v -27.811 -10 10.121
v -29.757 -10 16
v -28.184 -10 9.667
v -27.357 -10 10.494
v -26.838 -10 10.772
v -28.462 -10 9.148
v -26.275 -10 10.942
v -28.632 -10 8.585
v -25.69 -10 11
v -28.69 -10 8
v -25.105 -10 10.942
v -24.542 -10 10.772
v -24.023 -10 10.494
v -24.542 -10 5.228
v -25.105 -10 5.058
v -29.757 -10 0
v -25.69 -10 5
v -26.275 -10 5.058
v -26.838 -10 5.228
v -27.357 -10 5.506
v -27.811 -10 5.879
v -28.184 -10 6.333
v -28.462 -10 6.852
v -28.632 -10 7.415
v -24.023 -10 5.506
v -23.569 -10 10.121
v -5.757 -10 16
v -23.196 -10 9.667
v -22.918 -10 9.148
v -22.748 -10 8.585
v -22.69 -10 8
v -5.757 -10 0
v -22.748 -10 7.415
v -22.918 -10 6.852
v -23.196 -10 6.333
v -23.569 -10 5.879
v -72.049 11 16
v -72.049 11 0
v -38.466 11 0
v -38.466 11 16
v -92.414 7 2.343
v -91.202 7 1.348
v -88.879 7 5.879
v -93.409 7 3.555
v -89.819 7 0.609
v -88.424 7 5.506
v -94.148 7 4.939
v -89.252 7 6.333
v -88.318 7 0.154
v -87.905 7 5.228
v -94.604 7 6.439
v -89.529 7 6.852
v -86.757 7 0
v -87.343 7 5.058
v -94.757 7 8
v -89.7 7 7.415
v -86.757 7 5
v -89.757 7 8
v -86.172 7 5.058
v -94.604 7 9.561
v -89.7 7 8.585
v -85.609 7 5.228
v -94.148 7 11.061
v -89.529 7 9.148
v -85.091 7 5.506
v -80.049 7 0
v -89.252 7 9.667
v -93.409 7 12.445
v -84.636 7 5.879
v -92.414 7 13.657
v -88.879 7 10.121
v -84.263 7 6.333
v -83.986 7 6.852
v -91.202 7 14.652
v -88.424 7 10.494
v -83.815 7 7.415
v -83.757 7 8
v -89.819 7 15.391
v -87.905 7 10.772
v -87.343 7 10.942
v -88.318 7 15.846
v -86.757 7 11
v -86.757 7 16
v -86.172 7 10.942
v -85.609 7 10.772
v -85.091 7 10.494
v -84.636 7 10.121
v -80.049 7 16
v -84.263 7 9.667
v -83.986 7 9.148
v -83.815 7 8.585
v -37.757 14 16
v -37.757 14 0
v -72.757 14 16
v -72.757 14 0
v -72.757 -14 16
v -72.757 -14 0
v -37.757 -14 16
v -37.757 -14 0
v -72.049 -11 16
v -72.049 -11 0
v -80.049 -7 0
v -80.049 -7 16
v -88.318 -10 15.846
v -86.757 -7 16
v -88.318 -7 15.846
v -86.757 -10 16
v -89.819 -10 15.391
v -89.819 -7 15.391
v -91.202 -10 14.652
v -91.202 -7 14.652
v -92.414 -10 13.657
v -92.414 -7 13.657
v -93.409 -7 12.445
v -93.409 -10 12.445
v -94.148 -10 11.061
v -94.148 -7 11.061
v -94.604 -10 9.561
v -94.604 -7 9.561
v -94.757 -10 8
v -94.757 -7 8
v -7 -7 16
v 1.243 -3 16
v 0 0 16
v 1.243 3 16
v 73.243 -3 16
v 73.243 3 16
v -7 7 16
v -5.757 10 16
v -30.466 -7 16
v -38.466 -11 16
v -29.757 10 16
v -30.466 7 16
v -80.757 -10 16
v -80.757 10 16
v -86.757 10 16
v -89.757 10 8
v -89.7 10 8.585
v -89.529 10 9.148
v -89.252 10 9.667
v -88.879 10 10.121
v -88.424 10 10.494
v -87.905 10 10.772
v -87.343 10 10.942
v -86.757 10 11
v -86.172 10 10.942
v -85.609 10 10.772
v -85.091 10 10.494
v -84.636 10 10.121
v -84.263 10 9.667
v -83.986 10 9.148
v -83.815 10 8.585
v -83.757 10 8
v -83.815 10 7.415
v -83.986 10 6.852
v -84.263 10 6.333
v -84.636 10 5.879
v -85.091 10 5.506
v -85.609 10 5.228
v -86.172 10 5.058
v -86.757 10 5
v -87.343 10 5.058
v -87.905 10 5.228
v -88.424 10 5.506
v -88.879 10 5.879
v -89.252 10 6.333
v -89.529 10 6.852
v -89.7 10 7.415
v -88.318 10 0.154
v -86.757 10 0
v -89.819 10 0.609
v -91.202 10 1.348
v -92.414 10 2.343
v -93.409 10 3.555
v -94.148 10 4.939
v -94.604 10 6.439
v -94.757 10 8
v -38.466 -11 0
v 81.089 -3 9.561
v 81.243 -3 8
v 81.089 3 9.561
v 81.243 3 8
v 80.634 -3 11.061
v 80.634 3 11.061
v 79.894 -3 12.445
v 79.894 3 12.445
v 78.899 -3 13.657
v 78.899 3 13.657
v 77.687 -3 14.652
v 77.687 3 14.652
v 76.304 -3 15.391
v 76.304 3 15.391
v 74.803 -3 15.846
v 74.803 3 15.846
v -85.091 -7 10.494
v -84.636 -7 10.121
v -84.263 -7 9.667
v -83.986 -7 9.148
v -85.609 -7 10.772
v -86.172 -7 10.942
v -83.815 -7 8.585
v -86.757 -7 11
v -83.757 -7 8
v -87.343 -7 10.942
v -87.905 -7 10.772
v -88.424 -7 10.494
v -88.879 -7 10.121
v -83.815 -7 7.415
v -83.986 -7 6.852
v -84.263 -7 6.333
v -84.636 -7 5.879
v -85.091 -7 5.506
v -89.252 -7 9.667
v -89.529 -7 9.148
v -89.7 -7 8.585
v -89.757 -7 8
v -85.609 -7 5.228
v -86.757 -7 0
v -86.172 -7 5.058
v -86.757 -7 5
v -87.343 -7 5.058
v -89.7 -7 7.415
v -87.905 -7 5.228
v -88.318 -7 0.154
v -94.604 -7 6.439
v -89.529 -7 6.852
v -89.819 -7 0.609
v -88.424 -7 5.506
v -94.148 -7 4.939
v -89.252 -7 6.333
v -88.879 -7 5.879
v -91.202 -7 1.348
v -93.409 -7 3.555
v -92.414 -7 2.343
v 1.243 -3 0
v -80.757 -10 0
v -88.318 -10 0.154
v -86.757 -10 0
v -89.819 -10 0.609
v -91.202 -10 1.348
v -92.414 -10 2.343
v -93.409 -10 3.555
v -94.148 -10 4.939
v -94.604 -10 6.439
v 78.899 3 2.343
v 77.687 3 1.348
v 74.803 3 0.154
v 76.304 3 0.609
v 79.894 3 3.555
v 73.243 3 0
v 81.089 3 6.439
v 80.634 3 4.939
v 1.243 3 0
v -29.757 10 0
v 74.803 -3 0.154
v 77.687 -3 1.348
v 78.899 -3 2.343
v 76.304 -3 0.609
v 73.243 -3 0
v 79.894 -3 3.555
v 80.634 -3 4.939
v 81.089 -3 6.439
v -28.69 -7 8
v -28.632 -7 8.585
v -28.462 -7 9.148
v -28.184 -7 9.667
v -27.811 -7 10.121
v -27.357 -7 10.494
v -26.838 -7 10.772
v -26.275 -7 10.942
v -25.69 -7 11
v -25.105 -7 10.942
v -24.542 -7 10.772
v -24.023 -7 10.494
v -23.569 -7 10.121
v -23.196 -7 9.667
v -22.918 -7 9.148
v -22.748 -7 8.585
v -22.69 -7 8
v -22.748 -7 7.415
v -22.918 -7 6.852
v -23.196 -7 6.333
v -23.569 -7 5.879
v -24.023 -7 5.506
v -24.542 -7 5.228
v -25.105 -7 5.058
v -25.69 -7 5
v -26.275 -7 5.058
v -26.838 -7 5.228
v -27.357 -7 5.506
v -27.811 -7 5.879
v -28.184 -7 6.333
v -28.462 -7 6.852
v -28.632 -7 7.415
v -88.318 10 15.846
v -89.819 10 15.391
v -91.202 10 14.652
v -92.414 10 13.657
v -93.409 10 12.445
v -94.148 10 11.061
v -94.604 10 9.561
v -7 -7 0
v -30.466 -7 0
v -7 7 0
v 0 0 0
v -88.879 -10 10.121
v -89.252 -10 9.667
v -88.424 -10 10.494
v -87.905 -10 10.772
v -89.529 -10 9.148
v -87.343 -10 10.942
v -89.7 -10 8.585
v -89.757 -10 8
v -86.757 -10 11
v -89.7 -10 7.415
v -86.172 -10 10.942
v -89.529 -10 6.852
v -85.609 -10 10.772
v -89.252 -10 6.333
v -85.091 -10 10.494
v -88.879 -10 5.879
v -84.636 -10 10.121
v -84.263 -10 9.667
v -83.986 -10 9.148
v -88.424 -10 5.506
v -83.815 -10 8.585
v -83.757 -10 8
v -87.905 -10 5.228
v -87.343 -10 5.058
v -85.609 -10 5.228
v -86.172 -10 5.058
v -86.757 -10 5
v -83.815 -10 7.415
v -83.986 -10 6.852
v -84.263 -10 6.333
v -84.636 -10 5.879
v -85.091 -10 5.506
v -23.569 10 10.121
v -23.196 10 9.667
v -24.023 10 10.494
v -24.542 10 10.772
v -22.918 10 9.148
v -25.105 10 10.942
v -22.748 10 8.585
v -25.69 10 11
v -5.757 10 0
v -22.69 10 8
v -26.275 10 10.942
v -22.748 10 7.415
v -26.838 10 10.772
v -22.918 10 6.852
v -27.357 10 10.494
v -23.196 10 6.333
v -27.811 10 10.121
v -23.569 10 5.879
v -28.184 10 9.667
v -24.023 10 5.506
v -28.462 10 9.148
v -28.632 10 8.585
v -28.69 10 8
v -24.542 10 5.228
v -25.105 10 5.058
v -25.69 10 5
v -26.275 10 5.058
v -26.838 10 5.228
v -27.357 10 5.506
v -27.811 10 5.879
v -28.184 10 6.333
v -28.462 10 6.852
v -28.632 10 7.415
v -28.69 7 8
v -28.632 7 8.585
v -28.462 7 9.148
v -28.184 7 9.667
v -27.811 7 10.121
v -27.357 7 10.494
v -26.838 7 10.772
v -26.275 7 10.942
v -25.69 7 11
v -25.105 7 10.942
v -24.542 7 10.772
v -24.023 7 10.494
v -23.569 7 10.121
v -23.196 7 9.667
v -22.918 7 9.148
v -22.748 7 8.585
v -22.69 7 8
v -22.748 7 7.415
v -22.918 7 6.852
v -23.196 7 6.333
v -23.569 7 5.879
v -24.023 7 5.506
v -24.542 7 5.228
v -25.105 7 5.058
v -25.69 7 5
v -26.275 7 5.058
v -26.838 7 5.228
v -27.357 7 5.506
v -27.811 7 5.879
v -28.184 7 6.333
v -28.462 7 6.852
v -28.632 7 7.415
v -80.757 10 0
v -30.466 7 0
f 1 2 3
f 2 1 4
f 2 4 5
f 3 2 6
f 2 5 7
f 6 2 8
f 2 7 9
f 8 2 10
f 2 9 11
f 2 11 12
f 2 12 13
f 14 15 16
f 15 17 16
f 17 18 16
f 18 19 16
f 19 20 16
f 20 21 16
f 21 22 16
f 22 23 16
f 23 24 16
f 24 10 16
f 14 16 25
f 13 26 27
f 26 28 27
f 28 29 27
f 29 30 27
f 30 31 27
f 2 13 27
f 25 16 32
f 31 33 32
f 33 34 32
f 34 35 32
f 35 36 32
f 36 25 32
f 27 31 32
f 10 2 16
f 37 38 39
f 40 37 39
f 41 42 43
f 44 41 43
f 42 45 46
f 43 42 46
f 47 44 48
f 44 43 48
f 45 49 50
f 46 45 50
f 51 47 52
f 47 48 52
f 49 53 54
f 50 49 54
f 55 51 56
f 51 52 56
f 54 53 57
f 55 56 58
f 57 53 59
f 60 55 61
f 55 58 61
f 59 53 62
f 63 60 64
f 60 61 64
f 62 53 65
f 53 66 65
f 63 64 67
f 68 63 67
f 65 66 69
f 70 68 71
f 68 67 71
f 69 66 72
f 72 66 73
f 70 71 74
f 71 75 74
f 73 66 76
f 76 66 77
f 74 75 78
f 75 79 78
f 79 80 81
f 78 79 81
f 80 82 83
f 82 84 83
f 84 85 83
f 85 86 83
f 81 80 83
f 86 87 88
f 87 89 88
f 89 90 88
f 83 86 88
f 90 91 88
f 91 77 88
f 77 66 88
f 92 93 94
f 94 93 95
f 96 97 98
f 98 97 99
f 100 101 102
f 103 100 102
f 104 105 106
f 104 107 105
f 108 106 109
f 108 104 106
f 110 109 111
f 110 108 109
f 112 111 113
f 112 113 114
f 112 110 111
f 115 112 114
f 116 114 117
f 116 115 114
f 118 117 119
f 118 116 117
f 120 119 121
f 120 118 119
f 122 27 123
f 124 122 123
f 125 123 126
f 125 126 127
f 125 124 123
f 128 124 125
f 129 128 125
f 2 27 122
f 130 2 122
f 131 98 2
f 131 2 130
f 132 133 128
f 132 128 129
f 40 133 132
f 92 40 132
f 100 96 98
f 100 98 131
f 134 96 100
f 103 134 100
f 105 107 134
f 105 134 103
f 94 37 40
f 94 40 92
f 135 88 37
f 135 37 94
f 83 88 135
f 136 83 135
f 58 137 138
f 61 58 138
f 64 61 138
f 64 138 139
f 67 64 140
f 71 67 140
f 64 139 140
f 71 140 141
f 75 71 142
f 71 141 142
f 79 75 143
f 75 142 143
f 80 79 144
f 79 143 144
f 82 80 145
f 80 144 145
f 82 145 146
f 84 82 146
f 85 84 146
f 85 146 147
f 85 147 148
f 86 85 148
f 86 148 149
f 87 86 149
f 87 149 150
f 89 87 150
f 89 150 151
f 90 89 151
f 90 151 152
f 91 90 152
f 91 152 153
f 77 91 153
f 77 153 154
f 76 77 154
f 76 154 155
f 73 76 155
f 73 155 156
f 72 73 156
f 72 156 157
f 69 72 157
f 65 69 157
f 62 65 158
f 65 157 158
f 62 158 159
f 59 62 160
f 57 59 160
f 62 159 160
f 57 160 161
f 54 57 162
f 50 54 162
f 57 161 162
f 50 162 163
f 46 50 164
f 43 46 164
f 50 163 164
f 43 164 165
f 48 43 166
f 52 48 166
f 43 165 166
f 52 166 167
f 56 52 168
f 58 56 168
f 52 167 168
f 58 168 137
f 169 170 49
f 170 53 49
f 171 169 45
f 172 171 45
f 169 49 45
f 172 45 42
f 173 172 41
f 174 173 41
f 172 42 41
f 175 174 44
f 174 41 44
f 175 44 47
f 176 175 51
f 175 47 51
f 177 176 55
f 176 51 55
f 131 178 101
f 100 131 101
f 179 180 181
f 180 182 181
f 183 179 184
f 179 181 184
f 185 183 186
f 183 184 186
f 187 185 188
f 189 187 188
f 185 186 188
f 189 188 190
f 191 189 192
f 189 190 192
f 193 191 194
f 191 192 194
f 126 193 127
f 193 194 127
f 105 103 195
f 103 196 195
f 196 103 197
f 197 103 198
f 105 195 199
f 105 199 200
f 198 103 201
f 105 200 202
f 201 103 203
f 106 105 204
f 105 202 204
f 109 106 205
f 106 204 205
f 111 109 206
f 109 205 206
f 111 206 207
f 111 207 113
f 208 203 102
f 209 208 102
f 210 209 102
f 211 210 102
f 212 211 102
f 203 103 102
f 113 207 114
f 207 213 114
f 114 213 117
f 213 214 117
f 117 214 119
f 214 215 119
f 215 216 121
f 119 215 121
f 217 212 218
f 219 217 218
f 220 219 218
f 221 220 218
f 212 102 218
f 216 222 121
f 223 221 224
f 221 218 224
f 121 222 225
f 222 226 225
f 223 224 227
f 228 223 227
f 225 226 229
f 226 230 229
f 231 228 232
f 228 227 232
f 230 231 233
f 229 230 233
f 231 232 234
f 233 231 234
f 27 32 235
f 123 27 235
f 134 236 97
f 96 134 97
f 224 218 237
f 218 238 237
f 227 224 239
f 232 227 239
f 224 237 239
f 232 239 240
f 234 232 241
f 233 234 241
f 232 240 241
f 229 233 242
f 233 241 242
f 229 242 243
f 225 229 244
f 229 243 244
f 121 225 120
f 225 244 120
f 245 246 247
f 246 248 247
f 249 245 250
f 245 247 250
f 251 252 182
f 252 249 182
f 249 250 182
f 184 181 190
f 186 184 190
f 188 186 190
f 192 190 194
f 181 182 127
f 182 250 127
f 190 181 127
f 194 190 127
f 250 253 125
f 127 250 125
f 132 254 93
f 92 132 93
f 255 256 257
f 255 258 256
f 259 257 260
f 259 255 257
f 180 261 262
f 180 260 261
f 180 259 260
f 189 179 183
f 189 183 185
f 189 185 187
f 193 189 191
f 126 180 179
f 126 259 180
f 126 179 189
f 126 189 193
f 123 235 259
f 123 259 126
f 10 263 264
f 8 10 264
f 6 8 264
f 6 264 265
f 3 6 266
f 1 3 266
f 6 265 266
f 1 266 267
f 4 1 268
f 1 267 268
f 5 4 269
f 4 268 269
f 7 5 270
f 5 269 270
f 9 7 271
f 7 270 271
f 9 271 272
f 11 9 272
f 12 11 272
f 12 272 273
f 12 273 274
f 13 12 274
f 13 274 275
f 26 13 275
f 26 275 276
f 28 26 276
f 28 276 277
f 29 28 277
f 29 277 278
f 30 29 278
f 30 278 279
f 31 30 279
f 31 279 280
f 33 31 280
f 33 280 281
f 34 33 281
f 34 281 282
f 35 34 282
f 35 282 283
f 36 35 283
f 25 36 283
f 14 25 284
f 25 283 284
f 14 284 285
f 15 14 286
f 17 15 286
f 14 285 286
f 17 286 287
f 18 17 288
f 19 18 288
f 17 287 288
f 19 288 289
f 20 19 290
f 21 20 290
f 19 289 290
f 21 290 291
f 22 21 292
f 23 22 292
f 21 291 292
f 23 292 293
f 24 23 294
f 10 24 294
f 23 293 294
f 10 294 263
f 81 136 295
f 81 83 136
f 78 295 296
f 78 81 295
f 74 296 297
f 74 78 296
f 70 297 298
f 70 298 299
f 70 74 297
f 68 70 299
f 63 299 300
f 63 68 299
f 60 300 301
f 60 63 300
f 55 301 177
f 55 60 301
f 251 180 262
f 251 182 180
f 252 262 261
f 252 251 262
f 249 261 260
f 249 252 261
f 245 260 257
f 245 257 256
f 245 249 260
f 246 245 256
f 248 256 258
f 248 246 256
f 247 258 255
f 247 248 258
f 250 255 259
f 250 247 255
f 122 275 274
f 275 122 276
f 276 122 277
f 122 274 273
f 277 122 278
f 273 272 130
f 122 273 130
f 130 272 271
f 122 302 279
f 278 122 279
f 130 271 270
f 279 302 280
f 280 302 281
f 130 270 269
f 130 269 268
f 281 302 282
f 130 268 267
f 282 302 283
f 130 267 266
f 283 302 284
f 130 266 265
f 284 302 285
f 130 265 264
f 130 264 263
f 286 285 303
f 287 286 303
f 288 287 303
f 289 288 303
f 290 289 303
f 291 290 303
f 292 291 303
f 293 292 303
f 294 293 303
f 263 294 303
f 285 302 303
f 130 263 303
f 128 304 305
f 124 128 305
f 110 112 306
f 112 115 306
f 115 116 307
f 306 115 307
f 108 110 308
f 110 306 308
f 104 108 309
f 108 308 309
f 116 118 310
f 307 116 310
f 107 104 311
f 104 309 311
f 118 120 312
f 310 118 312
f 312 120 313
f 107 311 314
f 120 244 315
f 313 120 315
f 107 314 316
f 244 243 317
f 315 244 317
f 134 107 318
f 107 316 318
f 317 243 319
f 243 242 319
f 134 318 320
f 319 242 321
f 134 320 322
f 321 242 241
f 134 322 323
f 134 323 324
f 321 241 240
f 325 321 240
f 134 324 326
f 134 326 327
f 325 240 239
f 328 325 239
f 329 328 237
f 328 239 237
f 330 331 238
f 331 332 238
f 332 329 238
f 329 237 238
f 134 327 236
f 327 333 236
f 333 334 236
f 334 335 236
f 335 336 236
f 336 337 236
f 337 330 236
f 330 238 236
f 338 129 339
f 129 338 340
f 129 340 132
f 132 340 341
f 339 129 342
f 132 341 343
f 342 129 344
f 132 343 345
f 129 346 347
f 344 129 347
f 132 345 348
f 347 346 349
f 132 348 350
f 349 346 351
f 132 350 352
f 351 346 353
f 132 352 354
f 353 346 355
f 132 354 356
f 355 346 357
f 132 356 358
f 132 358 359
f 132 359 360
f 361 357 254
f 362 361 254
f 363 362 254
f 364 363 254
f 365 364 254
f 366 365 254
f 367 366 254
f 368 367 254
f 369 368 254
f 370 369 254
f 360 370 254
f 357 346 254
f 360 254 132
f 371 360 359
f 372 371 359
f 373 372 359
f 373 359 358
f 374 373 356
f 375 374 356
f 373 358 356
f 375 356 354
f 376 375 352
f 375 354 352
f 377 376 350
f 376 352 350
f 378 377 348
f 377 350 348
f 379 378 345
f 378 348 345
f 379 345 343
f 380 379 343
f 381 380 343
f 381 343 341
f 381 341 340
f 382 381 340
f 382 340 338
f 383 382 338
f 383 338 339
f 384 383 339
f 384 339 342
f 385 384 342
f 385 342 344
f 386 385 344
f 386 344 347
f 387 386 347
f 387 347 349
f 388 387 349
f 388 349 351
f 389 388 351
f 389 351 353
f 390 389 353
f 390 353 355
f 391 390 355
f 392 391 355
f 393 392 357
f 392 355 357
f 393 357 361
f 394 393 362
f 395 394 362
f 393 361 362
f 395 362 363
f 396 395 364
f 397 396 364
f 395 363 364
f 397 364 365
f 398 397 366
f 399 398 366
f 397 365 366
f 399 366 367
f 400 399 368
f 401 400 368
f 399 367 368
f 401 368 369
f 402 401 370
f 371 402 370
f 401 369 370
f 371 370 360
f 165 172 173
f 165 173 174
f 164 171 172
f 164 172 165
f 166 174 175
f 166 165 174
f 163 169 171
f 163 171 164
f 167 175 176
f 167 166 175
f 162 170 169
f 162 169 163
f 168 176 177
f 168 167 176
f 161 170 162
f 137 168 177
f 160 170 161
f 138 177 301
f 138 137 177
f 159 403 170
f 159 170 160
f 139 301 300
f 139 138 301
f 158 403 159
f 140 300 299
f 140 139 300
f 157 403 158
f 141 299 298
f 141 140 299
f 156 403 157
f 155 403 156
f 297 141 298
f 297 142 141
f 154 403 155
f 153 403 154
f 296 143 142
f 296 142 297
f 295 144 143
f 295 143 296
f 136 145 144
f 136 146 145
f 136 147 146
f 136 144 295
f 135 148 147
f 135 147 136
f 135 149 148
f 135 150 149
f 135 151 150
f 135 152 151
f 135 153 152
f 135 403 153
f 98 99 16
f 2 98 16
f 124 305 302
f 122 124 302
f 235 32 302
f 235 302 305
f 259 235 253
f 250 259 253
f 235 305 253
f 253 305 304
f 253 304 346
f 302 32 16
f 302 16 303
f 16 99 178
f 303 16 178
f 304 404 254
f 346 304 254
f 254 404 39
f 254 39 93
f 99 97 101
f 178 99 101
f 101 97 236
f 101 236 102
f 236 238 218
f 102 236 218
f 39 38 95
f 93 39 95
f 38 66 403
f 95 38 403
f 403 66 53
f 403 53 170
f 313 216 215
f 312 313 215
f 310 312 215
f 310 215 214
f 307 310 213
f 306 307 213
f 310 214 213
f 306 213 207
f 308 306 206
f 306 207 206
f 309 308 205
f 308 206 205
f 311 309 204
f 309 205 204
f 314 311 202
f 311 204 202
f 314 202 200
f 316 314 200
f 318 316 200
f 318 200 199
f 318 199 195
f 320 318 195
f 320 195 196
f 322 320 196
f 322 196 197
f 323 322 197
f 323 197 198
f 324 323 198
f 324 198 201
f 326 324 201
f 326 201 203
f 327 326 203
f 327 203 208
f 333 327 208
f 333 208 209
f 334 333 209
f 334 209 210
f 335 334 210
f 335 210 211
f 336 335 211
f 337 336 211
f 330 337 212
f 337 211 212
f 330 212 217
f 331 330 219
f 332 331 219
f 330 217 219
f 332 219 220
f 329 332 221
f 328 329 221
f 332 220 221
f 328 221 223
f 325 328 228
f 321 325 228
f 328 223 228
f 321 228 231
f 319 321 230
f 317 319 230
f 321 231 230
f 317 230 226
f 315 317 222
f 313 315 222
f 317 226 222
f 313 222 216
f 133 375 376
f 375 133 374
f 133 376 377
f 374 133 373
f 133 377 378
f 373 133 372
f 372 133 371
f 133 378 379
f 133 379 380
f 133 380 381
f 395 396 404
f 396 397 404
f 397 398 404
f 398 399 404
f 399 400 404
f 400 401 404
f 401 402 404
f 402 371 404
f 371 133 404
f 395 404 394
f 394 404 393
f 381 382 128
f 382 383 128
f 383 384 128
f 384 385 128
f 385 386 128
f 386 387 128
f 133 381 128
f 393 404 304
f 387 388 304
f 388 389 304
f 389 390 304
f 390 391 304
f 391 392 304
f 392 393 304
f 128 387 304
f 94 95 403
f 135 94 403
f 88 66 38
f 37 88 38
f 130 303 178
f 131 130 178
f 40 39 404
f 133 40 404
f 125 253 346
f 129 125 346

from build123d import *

# Parameters (mm, degrees)
F1_DEPTH = 16
F3_W     = 3
F3_H     = 16
F5_DEPTH = 8
F4_W     = 6
F4_H     = 16
F6_DEPTH = 8
F7_D     = 6
F8_R     = 7.99999


# Not quite as in the source:
# - a fillet or chamfer is up to 0.001 mm smaller than in the source, because OpenCascade refuses the exact size


with BuildPart() as f1:
    # F0 (on Top) → F1 (new body)
    with BuildSketch(Plane.XY):
        Polygon((-80.7573593129, 10), (-86.7573593129, 10), (-86.7573593129, 7), (-80.0491553804, 7), (-72.0491553804, 11), (-38.4655632454, 11), (-30.4655632454, 7), (-7, 7), (0, 0), (-7, -7), (-30.4655632454, -7), (-38.4655632454, -11), (-72.0491553804, -11), (-80.0491553804, -7), (-86.7573593129, -7), (-86.7573593129, -10), (-80.7573593129, -10), (-72.7573593129, -14), (-37.7573593129, -14), (-29.7573593129, -10), (-5.7573593129, -10), (1.2426406871, -3), (73.2426406871, -3), (73.2426406871, 3), (1.2426406871, 3), (-5.7573593129, 10), (-29.7573593129, 10), (-37.7573593129, 14), (-72.7573593129, 14), align=None)
    extrude(amount=F1_DEPTH)

    # F3 (on face) → F5 (join)
    with BuildSketch(Plane(origin=(-86.7573593129, 0, 0), x_dir=(0, -1, 0), z_dir=(-1, 0, 0))):
        with Locations((-8.5, 8)):
            Rectangle(F3_W, F3_H)
        with Locations((8.5, 8)):
            Rectangle(F3_W, F3_H)
    extrude(amount=F5_DEPTH)

    # F4 (on face) → F6 (join)
    with BuildSketch(Plane.YZ.offset(73.2426406871)):
        with Locations((0, 8)):
            Rectangle(F4_W, F4_H)
    extrude(amount=F6_DEPTH)

    # F7 (through all)
    with Locations(Plane.XZ.offset(10)):
        with Locations((-86.7573593129, 8), (-25.6900005043, 8)):
            Hole(F7_D / 2)

    # F8 (radius 8 in the source; OpenCascade refuses exactly that, so slightly less here)
    f8_edges = [f1.edges().sort_by_distance(p)[0] for p in [
        (-94.757359, -8.5, 16),
        (-94.757359, -8.5, 0),
        (-94.757359, 8.5, 0),
        (-94.757359, 8.5, 16),
        (81.242641, 0, 16),
        (81.242641, 0, 0),
    ]]
    fillet(f8_edges, radius=F8_R)


solid = f1.part
